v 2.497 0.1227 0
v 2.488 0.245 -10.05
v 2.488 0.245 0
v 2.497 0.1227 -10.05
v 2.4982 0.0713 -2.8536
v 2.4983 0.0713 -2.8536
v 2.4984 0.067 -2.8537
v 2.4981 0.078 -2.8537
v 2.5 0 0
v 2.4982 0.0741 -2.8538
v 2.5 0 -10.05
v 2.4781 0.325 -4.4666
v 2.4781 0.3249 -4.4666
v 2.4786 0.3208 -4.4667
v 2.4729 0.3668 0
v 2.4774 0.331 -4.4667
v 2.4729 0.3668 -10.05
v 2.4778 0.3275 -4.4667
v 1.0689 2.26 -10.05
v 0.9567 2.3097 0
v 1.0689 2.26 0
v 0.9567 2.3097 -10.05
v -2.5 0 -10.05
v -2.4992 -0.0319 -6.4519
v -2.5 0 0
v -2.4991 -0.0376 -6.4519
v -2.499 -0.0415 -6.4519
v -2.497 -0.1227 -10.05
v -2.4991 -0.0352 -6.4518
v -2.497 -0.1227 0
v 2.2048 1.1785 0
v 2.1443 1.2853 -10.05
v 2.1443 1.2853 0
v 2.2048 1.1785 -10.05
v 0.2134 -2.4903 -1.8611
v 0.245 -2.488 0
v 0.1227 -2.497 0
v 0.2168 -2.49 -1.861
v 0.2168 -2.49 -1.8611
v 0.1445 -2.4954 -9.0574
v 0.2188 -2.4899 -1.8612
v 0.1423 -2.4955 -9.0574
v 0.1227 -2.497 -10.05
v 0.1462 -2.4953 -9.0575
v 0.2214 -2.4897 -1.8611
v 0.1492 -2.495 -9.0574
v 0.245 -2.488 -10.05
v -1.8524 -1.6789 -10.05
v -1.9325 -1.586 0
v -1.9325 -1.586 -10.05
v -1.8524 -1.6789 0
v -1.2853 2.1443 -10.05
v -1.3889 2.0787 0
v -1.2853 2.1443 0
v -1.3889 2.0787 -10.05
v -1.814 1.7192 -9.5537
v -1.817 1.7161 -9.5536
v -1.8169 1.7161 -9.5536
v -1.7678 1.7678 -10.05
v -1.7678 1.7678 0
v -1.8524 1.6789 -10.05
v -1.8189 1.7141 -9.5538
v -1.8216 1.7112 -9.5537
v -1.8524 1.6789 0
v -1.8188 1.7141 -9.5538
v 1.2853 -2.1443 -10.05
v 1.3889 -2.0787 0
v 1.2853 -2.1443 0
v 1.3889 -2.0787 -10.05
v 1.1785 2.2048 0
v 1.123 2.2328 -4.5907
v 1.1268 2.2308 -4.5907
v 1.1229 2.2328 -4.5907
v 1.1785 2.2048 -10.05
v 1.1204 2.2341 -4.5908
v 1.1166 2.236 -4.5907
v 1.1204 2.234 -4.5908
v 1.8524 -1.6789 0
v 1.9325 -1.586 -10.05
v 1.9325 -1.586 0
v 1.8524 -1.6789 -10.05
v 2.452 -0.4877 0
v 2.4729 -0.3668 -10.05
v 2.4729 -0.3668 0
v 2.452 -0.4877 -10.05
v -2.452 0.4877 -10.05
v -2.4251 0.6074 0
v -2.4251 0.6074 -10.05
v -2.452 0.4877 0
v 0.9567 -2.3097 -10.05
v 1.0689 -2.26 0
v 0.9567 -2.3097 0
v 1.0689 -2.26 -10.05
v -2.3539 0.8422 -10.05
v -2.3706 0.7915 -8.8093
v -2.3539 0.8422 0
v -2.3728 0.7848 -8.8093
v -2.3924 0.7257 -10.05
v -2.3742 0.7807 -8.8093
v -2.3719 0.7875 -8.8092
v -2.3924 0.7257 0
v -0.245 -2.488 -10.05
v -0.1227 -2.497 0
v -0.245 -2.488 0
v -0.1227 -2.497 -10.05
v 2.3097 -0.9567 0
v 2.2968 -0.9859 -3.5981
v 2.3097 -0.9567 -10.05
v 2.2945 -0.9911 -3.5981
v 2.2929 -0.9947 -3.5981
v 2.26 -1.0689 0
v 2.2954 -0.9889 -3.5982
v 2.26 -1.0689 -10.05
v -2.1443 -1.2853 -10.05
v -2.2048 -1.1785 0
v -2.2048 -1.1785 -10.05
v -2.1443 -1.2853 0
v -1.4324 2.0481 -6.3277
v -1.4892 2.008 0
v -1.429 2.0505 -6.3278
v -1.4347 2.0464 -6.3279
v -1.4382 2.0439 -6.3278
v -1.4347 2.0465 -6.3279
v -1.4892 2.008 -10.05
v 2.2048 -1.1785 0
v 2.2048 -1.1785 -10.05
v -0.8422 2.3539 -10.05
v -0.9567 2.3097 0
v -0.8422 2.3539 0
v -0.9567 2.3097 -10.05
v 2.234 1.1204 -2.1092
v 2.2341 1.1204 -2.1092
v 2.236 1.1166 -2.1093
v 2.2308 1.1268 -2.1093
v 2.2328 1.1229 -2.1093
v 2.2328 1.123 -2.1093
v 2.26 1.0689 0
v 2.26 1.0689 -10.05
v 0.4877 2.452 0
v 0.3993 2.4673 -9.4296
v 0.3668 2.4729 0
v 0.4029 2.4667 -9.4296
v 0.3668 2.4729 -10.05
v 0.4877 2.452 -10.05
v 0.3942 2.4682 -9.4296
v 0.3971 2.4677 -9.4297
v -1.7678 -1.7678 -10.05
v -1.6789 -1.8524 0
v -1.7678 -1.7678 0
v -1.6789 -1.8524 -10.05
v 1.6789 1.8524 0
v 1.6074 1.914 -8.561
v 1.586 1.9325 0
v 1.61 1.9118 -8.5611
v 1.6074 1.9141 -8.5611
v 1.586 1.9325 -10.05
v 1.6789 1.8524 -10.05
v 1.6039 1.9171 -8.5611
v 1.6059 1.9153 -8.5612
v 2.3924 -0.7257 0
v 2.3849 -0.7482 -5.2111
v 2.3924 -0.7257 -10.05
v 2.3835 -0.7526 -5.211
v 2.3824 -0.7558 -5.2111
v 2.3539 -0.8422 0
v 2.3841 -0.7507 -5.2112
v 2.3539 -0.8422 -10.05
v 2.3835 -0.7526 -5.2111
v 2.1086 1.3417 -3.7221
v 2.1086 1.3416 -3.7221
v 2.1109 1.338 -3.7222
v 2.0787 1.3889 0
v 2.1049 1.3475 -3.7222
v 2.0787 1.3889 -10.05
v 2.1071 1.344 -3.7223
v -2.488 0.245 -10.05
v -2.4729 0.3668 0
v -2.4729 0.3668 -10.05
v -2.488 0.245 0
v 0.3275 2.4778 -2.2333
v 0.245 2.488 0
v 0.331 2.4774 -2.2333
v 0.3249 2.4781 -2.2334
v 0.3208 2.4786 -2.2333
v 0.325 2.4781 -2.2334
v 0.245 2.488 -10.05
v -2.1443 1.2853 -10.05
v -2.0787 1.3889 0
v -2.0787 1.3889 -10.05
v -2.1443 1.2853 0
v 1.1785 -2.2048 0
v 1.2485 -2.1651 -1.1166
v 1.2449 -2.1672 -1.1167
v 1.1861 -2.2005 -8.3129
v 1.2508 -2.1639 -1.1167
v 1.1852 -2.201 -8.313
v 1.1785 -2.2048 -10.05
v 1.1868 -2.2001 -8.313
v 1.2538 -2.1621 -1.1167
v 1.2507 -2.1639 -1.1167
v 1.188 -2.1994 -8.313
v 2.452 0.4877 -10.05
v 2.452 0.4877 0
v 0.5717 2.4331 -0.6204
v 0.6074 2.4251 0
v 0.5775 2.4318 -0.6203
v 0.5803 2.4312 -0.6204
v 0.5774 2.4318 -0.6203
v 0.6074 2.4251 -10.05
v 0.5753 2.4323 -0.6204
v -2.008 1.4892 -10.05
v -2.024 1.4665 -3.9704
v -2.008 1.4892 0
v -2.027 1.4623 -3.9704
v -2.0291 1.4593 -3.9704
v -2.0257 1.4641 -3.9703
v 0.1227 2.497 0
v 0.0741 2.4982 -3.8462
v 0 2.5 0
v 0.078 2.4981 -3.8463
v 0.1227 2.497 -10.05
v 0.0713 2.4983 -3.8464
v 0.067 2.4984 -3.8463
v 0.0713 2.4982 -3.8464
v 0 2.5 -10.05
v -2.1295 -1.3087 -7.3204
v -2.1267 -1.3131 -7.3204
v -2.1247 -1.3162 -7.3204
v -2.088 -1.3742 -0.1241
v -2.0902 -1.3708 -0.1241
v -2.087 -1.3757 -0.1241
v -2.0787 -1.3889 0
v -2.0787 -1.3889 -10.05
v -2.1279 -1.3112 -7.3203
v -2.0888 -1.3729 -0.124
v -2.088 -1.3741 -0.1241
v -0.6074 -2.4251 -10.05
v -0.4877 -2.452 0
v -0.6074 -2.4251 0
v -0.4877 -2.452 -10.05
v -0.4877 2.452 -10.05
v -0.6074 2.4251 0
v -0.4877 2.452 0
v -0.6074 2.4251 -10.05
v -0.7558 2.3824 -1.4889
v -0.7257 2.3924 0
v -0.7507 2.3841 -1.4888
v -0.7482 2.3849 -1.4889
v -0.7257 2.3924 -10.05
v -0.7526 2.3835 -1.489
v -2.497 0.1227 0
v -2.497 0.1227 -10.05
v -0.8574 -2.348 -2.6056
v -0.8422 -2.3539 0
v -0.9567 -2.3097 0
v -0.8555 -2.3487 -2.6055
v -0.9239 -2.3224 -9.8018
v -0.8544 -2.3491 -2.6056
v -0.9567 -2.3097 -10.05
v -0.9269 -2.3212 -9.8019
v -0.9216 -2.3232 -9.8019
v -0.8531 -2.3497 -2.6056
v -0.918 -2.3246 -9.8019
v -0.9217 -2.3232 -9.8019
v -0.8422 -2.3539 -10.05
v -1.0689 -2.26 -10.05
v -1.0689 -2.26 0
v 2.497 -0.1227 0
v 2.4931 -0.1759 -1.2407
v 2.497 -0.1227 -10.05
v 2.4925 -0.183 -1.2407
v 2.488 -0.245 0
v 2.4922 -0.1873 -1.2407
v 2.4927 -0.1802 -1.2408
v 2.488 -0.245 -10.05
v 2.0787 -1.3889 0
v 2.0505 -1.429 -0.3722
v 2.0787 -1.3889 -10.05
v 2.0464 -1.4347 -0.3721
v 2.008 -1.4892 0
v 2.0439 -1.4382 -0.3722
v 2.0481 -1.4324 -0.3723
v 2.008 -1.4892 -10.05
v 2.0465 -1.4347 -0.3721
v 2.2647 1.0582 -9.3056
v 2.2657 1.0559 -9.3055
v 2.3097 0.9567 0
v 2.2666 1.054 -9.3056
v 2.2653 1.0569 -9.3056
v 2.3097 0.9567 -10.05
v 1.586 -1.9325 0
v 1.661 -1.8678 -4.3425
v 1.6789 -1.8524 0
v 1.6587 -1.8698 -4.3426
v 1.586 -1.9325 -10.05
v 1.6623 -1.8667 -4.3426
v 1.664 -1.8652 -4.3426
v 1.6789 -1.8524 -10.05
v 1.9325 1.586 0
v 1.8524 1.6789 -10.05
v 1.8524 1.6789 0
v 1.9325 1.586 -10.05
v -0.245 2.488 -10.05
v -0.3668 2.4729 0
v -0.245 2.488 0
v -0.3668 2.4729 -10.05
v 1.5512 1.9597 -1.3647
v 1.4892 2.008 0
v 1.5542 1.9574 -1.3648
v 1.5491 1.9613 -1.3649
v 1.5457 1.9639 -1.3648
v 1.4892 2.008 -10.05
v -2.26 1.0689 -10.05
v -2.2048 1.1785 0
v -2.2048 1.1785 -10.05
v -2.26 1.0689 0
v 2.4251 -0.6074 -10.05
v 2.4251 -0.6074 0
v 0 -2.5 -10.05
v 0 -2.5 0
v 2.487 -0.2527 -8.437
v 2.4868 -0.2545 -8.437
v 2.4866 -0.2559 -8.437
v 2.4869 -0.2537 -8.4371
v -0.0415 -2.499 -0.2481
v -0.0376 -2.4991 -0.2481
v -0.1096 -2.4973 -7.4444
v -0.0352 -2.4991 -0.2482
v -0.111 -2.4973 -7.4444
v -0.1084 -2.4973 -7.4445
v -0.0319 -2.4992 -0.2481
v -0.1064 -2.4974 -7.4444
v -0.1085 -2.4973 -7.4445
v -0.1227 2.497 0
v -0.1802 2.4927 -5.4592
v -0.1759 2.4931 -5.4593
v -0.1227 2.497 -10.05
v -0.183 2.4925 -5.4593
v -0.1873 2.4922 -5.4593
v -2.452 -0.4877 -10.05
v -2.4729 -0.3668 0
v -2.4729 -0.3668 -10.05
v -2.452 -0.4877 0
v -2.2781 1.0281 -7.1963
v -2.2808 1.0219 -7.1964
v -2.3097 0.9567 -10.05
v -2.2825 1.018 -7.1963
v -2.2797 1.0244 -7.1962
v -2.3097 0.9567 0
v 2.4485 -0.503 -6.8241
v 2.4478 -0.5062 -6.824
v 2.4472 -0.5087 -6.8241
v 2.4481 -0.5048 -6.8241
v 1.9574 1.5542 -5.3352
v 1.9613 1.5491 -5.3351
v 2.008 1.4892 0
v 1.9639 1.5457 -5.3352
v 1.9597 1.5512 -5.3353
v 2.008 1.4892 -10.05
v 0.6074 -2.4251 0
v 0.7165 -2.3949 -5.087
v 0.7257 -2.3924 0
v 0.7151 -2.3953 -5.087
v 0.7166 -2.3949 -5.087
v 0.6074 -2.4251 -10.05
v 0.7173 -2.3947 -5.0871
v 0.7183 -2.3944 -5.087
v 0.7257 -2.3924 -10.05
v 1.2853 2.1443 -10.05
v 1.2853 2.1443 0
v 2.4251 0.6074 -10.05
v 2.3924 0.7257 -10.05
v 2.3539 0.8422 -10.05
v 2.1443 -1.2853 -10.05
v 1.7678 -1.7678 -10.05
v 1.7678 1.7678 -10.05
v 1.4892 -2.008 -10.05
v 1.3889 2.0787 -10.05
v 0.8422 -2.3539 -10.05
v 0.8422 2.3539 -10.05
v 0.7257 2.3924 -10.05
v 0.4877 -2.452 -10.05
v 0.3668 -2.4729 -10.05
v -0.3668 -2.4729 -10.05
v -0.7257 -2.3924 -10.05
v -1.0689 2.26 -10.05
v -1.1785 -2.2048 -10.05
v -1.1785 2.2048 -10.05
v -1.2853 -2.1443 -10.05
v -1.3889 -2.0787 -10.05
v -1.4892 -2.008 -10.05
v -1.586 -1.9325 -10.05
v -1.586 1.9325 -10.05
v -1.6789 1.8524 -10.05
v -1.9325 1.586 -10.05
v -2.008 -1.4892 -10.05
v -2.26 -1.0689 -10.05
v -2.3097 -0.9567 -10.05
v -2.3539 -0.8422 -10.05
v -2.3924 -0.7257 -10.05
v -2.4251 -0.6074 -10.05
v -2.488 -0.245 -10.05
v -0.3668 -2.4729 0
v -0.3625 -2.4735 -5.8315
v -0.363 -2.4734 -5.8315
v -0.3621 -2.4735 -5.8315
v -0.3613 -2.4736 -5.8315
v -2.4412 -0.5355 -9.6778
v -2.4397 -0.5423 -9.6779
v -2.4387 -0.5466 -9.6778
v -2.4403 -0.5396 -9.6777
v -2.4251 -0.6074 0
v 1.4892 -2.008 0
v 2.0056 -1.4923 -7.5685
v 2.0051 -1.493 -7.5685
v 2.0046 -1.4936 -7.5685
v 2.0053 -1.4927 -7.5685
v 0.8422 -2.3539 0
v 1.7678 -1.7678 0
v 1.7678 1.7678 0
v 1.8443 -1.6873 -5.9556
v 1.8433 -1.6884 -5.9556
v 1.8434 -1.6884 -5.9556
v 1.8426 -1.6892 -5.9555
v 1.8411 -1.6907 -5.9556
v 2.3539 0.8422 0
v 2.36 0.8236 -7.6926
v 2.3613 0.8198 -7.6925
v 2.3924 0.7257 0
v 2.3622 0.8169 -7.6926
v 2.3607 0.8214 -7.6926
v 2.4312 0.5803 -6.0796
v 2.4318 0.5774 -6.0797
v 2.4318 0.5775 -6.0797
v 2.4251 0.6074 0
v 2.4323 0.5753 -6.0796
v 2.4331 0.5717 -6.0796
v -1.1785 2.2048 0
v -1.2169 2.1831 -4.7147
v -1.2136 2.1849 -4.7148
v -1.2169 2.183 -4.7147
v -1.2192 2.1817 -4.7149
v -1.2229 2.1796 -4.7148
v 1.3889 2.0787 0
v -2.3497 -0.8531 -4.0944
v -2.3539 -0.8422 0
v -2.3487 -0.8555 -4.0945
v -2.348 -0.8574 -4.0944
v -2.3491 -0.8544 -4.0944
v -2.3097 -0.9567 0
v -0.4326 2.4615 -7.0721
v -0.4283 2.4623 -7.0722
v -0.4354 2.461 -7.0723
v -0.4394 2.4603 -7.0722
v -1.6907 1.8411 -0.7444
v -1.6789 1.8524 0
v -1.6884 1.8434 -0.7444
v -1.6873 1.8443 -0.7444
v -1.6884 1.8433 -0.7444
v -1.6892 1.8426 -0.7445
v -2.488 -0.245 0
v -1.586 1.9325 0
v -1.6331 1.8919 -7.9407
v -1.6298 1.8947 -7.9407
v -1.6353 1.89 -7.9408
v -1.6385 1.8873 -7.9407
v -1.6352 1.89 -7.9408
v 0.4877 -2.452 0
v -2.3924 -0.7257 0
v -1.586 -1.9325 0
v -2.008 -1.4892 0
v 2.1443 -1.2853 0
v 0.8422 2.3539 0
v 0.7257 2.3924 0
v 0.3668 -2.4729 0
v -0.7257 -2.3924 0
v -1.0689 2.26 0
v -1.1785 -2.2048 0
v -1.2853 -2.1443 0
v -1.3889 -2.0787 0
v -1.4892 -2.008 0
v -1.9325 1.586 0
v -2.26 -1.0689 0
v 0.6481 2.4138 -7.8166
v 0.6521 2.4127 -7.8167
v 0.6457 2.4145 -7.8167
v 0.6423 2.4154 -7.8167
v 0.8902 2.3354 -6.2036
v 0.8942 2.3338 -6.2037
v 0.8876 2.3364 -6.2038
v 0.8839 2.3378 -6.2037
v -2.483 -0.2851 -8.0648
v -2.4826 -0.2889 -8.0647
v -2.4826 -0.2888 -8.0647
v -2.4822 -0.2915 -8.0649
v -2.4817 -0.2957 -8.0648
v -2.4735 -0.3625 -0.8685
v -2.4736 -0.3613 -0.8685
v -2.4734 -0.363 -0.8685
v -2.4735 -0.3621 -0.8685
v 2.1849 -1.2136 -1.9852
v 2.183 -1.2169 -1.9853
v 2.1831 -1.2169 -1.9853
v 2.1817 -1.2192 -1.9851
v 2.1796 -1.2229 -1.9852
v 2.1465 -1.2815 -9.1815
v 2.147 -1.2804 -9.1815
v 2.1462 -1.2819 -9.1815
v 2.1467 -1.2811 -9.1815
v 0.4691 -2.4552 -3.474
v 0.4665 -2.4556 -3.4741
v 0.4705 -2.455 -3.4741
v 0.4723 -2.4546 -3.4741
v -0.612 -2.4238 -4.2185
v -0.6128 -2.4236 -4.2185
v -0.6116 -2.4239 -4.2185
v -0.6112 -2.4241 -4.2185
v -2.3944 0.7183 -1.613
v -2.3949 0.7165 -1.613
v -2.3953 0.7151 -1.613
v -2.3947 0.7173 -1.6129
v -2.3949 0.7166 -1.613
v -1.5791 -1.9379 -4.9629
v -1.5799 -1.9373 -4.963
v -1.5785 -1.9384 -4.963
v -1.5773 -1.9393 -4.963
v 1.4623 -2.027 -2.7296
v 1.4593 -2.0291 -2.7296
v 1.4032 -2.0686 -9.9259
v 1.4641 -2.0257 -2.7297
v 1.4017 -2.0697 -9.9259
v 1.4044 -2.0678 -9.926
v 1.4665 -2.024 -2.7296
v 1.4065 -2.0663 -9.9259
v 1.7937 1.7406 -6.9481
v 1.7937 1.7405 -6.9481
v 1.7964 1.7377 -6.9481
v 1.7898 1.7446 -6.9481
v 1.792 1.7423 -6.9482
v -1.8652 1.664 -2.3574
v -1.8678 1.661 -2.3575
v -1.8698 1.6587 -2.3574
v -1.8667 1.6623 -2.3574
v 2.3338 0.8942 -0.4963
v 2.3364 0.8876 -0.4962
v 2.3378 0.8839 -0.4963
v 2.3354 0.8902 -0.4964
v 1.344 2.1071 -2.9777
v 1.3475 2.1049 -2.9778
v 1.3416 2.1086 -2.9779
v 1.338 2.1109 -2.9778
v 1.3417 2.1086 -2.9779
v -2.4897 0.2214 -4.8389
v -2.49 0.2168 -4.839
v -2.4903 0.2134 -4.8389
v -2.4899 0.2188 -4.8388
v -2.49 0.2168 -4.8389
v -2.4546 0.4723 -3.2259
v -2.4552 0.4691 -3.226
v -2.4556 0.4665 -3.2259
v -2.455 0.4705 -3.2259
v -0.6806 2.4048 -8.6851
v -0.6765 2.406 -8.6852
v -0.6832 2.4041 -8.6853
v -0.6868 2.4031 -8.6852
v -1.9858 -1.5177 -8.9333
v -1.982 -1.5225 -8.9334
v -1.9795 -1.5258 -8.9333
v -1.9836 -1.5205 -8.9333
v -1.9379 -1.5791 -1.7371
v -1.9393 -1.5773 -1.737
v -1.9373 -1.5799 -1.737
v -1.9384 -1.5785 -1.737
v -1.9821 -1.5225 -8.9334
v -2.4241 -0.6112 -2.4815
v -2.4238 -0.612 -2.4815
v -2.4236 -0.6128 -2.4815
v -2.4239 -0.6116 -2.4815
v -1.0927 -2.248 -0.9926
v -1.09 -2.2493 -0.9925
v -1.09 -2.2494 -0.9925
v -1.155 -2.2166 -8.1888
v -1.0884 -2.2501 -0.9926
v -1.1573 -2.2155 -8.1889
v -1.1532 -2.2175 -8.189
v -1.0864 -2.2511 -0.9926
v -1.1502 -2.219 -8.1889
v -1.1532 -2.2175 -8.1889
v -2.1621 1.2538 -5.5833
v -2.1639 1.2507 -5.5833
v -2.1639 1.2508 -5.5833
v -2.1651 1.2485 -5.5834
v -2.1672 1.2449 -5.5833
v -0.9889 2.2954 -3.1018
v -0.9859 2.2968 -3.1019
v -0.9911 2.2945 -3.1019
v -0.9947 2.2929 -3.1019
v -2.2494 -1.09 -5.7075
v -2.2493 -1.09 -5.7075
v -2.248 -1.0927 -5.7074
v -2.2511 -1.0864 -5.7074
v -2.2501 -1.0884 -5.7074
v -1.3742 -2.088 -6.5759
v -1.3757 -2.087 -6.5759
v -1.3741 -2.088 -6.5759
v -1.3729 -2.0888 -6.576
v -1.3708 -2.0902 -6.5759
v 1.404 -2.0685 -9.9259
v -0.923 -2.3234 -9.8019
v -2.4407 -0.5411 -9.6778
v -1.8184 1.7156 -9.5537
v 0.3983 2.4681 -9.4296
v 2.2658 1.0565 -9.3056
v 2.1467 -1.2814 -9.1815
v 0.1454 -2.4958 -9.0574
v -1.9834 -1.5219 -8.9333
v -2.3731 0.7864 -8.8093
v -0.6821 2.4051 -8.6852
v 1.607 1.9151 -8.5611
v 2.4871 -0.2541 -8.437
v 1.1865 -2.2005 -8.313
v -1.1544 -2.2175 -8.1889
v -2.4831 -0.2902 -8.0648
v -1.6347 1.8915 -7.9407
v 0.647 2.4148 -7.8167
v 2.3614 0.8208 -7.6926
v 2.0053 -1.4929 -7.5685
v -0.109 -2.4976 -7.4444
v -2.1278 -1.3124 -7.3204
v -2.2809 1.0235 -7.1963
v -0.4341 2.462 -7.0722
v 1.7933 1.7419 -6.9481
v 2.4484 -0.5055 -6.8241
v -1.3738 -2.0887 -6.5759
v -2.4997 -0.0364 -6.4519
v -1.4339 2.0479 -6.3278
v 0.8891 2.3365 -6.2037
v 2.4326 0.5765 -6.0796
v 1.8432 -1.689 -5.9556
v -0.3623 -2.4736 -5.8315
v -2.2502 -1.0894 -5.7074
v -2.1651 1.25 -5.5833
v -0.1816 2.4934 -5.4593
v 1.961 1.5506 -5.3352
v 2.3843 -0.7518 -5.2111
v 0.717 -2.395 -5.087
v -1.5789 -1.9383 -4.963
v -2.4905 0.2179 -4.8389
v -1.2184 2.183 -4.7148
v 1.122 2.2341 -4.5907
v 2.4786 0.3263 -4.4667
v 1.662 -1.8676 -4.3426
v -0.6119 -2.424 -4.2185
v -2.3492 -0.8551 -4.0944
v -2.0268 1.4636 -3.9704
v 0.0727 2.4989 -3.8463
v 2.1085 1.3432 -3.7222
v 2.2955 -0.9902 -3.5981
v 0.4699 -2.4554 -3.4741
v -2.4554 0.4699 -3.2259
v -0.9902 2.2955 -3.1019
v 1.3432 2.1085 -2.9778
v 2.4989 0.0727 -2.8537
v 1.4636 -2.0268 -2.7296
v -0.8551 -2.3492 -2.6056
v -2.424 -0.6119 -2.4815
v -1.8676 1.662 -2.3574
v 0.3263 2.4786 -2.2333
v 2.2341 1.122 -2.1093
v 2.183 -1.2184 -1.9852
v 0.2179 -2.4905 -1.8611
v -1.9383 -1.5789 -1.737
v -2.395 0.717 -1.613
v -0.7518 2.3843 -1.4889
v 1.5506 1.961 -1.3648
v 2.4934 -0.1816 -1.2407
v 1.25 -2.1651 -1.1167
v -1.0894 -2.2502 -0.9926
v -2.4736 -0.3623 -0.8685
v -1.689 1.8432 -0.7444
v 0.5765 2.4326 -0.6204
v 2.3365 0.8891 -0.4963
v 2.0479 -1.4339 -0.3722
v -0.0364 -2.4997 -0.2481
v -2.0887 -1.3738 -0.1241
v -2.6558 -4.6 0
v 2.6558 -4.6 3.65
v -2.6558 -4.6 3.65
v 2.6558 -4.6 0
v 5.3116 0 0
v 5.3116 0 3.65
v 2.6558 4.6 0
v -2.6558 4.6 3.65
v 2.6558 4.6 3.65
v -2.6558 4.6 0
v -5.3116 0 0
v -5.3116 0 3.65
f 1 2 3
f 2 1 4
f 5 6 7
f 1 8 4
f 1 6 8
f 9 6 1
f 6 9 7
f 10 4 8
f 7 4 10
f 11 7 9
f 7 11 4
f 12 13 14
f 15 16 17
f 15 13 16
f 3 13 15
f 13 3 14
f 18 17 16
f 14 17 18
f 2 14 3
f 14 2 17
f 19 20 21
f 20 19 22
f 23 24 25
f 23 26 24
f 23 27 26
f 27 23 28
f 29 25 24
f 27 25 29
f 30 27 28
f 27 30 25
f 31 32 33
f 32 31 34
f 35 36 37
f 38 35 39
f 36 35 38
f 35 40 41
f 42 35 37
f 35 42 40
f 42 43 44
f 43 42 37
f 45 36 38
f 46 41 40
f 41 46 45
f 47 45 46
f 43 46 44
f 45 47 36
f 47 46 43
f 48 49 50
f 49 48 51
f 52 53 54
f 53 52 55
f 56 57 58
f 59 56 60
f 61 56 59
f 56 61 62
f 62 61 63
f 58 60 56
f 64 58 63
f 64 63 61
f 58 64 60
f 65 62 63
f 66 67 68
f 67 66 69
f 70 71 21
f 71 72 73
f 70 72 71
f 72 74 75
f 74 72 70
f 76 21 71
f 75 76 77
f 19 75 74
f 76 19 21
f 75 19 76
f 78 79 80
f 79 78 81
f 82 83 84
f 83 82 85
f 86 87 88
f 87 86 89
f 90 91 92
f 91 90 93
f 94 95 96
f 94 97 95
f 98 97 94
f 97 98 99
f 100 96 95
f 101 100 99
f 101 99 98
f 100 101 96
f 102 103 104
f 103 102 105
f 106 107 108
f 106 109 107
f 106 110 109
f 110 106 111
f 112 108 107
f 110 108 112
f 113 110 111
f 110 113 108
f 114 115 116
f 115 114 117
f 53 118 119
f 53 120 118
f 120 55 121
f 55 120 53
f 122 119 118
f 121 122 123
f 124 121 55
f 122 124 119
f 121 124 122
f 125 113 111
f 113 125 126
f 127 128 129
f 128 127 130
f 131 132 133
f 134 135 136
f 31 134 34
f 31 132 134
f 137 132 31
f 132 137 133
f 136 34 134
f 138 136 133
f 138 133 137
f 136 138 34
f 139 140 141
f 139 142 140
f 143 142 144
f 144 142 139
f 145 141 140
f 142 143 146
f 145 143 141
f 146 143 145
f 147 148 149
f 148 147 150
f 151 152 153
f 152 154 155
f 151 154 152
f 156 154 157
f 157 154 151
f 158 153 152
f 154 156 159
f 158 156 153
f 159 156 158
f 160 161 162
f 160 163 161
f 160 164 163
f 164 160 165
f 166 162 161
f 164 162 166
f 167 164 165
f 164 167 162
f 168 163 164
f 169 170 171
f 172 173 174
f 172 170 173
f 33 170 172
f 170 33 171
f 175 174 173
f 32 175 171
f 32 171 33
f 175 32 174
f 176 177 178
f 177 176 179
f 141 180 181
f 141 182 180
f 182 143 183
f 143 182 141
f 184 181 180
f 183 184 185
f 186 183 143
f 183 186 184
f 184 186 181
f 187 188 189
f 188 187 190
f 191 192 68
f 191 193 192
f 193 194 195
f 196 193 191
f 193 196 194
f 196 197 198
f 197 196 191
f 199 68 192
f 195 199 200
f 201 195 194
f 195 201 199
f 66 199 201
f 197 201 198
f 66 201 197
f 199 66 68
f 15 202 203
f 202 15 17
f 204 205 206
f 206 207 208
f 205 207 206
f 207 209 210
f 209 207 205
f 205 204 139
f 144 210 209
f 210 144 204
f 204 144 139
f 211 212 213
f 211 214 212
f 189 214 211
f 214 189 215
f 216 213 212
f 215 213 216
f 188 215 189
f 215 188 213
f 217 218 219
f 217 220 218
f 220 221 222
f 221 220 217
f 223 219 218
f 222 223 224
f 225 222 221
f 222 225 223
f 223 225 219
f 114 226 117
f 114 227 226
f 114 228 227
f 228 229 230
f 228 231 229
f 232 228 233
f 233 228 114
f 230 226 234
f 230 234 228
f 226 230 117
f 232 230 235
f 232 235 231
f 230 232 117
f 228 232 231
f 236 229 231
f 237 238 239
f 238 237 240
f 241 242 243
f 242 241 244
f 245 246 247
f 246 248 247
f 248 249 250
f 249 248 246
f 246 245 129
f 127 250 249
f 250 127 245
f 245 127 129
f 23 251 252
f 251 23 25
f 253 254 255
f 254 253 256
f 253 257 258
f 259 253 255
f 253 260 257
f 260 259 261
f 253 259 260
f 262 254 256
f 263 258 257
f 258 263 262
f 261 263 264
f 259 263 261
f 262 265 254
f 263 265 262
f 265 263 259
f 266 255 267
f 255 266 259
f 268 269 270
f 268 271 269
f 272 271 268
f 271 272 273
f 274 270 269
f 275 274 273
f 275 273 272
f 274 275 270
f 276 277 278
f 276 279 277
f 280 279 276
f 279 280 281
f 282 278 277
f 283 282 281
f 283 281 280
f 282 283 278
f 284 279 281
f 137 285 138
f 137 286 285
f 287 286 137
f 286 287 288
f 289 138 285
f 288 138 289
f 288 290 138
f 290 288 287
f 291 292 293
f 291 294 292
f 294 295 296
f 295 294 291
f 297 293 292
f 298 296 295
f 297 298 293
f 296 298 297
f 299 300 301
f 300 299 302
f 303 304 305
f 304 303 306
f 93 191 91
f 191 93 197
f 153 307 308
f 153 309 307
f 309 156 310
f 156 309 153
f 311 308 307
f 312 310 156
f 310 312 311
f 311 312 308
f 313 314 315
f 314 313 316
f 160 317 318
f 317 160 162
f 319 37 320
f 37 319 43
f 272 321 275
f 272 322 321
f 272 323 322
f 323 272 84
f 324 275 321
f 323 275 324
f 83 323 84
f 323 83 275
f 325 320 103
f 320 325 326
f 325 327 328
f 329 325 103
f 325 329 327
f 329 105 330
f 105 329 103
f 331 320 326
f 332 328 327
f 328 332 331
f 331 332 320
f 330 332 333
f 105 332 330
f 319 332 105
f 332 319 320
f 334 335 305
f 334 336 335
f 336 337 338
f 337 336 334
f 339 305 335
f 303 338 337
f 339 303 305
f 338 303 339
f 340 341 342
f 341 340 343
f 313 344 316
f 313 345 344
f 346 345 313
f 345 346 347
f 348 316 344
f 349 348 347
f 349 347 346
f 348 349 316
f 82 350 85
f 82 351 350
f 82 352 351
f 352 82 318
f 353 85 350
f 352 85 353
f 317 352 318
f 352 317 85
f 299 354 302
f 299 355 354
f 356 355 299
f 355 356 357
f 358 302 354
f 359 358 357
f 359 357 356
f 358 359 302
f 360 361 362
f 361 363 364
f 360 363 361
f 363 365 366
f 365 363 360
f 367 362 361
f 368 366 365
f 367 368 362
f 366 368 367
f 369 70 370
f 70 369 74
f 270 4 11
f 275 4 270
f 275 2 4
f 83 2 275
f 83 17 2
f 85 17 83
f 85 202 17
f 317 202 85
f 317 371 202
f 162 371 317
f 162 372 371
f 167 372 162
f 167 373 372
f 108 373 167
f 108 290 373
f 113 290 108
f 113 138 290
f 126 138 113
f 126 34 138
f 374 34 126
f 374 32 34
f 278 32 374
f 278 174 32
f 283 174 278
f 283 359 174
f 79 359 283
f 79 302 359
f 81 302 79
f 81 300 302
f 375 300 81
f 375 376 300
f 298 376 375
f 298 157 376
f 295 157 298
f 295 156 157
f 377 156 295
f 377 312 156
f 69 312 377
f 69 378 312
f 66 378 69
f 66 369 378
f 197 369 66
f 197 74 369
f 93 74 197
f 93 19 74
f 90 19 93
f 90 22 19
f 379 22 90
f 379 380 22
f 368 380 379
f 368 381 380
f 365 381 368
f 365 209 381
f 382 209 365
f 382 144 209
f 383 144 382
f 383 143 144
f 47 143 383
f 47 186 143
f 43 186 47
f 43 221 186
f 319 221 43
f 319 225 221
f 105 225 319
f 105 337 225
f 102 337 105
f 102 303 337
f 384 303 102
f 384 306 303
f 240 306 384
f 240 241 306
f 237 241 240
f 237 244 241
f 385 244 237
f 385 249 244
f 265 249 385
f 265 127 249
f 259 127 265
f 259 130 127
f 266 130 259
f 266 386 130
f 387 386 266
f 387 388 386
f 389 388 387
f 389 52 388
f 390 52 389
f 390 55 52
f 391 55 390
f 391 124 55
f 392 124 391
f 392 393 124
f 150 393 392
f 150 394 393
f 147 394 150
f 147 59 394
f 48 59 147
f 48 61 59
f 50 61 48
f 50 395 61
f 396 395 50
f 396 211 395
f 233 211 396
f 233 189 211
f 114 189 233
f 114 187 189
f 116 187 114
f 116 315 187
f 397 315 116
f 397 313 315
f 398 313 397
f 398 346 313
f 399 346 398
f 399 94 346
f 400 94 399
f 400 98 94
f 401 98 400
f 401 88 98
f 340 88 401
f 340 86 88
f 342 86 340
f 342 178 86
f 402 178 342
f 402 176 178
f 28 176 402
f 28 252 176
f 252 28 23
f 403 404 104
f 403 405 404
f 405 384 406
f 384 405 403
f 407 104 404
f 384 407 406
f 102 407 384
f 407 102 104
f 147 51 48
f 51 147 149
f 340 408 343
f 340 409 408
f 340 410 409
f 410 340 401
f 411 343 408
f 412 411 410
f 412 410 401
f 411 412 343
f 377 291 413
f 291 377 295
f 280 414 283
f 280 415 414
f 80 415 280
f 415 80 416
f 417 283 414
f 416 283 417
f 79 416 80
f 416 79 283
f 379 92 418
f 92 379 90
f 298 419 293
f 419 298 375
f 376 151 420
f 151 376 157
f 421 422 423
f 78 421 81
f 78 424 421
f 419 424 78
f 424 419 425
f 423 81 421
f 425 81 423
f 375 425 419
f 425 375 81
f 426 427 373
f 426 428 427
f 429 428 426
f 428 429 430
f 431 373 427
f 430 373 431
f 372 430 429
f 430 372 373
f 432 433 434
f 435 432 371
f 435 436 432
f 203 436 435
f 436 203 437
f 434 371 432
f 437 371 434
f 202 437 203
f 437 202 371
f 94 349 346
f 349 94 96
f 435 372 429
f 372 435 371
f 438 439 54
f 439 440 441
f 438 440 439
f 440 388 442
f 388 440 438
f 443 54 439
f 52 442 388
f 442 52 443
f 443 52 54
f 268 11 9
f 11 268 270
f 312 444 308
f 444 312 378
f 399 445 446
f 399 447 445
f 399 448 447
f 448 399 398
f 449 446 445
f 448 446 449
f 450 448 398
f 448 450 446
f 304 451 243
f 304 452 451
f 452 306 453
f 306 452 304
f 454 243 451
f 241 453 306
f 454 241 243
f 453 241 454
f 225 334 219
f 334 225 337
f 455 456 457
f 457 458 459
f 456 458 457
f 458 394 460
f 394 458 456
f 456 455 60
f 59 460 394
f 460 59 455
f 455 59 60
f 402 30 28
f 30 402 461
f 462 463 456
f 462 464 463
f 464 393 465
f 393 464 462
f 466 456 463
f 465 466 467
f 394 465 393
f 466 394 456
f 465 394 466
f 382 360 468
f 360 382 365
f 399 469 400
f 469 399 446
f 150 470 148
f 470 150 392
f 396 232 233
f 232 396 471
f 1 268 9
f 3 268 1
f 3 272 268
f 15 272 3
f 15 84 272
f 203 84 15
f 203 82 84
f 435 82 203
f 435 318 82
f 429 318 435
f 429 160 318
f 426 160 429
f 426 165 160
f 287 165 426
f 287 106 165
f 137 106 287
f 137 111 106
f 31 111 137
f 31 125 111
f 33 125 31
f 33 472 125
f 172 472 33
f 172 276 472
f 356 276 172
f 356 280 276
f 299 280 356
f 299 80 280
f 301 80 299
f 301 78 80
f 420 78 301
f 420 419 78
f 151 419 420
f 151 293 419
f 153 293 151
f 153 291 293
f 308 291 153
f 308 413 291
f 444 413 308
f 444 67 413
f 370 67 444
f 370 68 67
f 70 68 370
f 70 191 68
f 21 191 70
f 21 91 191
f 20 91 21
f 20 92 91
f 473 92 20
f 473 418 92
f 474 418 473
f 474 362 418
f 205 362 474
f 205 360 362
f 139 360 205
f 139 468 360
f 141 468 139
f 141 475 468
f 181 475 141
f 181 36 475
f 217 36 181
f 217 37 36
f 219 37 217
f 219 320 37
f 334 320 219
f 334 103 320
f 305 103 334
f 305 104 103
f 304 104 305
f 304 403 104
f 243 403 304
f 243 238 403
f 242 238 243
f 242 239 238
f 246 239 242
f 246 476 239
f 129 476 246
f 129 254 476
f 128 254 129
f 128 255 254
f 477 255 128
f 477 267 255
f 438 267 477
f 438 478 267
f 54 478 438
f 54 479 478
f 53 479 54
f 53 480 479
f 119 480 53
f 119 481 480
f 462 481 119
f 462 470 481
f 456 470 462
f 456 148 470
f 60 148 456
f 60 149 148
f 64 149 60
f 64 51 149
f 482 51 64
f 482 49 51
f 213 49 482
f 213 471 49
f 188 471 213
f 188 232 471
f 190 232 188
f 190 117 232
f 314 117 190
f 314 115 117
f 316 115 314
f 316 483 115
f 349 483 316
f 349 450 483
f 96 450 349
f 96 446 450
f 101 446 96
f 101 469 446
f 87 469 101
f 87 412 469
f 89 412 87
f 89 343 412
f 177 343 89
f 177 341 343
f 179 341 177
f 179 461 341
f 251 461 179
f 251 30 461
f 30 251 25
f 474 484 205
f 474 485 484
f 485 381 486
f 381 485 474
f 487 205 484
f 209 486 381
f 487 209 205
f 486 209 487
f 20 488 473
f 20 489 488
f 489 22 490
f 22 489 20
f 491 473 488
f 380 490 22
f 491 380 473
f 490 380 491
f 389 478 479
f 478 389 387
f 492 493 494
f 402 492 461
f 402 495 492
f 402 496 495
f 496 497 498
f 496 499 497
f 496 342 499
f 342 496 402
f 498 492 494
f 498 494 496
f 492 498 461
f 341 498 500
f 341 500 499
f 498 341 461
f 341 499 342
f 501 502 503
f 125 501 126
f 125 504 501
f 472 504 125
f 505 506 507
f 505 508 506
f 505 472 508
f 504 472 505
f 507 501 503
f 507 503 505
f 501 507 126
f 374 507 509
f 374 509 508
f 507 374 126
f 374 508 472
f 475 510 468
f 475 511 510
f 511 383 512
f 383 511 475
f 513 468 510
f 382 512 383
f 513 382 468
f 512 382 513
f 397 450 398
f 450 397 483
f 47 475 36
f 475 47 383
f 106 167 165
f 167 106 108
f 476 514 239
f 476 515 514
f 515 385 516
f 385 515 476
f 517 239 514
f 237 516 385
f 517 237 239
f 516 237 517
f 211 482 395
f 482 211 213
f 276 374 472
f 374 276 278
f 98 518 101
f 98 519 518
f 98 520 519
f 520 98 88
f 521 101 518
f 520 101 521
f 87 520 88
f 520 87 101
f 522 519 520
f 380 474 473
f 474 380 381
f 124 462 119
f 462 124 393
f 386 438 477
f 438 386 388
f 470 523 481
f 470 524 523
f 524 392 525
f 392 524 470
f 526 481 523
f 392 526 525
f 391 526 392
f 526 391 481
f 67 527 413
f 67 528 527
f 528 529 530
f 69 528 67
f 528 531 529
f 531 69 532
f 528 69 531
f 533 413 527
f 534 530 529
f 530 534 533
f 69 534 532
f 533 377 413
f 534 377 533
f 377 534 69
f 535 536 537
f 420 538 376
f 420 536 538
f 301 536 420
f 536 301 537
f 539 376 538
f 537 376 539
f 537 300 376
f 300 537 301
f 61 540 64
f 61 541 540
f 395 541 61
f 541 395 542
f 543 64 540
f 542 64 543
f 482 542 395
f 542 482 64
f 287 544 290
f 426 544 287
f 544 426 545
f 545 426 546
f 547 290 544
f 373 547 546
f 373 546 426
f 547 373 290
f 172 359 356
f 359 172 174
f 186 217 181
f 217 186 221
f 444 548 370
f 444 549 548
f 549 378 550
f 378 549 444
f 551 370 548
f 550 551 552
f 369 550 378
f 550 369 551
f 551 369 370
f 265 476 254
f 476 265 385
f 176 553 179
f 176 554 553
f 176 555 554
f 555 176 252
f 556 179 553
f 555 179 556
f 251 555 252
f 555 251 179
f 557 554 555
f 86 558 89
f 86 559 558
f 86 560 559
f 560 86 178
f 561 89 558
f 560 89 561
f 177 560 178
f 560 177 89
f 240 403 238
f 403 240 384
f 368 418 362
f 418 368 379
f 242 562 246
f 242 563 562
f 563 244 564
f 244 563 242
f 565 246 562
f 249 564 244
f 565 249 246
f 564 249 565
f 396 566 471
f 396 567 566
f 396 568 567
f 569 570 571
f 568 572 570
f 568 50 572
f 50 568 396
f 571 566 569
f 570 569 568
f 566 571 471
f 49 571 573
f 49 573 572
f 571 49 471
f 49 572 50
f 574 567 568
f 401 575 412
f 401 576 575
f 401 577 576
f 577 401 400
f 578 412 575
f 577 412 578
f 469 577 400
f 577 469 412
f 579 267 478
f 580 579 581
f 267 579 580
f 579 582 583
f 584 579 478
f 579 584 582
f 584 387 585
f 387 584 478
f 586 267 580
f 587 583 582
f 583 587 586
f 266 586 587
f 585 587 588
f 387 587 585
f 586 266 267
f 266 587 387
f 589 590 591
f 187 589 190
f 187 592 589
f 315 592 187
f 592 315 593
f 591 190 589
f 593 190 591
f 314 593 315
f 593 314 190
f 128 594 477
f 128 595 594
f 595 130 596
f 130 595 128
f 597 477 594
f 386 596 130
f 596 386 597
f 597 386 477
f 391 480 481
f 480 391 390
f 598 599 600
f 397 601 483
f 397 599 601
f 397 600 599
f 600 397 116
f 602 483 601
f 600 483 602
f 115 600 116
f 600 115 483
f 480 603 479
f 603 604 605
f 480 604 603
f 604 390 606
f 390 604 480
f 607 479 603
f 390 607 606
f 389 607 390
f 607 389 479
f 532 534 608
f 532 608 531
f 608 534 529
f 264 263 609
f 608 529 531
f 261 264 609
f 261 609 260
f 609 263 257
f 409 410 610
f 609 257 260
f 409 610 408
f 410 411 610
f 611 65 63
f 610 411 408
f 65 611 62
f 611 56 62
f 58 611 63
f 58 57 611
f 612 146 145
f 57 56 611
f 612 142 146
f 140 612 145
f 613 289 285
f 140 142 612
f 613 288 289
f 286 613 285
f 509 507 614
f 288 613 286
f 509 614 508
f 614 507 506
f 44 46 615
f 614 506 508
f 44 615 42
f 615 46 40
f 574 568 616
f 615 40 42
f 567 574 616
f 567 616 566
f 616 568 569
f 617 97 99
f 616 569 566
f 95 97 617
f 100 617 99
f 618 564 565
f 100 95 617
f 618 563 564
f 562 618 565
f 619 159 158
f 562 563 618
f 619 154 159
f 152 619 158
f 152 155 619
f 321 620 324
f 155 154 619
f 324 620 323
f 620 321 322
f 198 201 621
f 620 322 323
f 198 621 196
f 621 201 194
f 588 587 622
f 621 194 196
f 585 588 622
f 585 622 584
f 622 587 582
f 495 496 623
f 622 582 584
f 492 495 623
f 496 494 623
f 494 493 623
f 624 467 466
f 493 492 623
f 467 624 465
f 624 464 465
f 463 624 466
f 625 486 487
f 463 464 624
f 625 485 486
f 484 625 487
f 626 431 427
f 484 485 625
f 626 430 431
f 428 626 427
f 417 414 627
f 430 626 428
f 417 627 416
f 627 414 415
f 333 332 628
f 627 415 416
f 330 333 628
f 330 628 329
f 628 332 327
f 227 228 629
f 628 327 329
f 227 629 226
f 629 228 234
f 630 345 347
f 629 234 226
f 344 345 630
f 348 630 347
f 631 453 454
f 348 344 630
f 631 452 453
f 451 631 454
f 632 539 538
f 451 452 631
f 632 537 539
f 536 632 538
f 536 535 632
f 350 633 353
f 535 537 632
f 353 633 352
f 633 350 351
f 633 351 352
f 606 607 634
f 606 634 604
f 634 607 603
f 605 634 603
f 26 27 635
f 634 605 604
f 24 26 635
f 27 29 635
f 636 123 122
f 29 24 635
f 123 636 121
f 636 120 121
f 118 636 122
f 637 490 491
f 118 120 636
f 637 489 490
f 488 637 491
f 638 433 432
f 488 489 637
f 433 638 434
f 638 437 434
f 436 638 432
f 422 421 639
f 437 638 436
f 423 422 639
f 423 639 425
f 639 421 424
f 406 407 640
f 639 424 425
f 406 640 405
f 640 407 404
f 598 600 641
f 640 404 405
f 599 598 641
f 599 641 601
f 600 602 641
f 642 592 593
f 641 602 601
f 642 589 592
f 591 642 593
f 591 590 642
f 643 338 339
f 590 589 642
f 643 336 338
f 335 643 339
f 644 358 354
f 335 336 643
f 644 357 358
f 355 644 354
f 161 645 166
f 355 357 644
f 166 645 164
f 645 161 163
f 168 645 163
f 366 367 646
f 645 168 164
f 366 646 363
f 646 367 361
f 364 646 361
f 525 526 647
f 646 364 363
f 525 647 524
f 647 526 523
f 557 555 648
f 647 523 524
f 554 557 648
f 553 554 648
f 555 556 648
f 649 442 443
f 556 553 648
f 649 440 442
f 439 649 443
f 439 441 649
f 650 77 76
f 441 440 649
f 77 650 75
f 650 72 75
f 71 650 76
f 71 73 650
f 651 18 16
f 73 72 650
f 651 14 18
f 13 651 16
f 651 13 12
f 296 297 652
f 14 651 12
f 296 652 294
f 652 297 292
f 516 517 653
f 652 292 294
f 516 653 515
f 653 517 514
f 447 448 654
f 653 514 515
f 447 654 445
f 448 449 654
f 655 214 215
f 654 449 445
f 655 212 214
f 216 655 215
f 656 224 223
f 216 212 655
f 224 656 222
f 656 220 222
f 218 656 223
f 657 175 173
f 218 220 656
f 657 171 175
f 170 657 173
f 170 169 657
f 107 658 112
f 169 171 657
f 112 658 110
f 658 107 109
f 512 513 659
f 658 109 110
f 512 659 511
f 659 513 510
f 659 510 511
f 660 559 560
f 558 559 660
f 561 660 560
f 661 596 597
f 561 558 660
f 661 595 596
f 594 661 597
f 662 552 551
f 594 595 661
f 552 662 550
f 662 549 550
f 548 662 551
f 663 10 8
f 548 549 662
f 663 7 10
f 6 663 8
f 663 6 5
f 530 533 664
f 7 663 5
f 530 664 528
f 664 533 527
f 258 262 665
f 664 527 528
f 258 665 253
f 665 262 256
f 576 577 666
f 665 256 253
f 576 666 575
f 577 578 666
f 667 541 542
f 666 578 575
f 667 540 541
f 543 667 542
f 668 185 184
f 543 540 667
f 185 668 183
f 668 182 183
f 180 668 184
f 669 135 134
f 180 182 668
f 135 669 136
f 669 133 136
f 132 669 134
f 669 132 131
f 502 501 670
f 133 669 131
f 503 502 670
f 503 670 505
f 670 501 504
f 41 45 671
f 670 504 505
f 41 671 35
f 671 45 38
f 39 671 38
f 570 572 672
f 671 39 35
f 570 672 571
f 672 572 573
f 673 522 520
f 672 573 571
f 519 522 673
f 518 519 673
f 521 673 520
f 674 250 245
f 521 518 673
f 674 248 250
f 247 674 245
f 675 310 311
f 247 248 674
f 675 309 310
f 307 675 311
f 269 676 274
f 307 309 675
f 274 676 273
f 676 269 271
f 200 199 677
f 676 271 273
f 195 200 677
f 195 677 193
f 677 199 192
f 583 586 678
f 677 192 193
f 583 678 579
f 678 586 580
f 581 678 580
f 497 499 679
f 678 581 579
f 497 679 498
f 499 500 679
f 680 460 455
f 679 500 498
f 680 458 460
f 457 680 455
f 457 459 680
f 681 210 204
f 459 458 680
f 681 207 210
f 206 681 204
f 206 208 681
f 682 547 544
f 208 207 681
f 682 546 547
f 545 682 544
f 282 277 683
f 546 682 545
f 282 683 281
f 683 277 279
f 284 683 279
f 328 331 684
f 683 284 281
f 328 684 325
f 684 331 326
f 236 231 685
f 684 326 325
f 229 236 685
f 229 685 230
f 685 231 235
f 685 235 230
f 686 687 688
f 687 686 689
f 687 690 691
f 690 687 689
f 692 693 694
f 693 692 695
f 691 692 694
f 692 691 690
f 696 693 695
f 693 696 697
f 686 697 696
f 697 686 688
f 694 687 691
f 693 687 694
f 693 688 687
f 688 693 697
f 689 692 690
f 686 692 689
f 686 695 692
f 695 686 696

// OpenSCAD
$fn = 128;

// Target dimensions (mm)
shaft_d = 5.0;
shaft_r = shaft_d/2;

head_d = 9.2;          // across flats
head_h = 3.65;

length_under_head = 10.0;   // shank length under head

// Simple external thread approximation (visual)
thread_pitch = 0.8;          // mm (approx for M5)
thread_depth = 0.35;         // mm radial (visual)
thread_starts = 1;
thread_turns = length_under_head / thread_pitch;

// Derived: hex circumradius from across-flats
head_R = head_d / sqrt(3);

// Small overlap to guarantee watertight union
eps = 0.05;

module hex_prism(h, across_flats) {
    R = across_flats / sqrt(3);
    cylinder(h=h, r=R, $fn=6);
}

module threaded_shank(len, r_core, pitch, depth, starts=1) {
    union() {
        // Core cylinder
        cylinder(h=len, r=r_core);

        // Helical ridge (approx thread)
        for (s = [0:starts-1]) {
            rotate([0,0, s*360/starts])
                linear_extrude(height=len, twist=360*(len/pitch), slices=max(ceil(len*8), 80))
                    translate([r_core - depth/2, 0, 0])
                        circle(r=depth/2, $fn=24);
        }
    }
}

module hex_head_screw() {
    union() {
        // Head: z from 0..head_h
        hex_prism(head_h, head_d);

        // Shank + threads: z from -length_under_head..0, overlapped into head by eps
        translate([0,0,-length_under_head - eps])
            threaded_shank(length_under_head + eps, shaft_r, thread_pitch, thread_depth, thread_starts);
    }
}

hex_head_screw();
